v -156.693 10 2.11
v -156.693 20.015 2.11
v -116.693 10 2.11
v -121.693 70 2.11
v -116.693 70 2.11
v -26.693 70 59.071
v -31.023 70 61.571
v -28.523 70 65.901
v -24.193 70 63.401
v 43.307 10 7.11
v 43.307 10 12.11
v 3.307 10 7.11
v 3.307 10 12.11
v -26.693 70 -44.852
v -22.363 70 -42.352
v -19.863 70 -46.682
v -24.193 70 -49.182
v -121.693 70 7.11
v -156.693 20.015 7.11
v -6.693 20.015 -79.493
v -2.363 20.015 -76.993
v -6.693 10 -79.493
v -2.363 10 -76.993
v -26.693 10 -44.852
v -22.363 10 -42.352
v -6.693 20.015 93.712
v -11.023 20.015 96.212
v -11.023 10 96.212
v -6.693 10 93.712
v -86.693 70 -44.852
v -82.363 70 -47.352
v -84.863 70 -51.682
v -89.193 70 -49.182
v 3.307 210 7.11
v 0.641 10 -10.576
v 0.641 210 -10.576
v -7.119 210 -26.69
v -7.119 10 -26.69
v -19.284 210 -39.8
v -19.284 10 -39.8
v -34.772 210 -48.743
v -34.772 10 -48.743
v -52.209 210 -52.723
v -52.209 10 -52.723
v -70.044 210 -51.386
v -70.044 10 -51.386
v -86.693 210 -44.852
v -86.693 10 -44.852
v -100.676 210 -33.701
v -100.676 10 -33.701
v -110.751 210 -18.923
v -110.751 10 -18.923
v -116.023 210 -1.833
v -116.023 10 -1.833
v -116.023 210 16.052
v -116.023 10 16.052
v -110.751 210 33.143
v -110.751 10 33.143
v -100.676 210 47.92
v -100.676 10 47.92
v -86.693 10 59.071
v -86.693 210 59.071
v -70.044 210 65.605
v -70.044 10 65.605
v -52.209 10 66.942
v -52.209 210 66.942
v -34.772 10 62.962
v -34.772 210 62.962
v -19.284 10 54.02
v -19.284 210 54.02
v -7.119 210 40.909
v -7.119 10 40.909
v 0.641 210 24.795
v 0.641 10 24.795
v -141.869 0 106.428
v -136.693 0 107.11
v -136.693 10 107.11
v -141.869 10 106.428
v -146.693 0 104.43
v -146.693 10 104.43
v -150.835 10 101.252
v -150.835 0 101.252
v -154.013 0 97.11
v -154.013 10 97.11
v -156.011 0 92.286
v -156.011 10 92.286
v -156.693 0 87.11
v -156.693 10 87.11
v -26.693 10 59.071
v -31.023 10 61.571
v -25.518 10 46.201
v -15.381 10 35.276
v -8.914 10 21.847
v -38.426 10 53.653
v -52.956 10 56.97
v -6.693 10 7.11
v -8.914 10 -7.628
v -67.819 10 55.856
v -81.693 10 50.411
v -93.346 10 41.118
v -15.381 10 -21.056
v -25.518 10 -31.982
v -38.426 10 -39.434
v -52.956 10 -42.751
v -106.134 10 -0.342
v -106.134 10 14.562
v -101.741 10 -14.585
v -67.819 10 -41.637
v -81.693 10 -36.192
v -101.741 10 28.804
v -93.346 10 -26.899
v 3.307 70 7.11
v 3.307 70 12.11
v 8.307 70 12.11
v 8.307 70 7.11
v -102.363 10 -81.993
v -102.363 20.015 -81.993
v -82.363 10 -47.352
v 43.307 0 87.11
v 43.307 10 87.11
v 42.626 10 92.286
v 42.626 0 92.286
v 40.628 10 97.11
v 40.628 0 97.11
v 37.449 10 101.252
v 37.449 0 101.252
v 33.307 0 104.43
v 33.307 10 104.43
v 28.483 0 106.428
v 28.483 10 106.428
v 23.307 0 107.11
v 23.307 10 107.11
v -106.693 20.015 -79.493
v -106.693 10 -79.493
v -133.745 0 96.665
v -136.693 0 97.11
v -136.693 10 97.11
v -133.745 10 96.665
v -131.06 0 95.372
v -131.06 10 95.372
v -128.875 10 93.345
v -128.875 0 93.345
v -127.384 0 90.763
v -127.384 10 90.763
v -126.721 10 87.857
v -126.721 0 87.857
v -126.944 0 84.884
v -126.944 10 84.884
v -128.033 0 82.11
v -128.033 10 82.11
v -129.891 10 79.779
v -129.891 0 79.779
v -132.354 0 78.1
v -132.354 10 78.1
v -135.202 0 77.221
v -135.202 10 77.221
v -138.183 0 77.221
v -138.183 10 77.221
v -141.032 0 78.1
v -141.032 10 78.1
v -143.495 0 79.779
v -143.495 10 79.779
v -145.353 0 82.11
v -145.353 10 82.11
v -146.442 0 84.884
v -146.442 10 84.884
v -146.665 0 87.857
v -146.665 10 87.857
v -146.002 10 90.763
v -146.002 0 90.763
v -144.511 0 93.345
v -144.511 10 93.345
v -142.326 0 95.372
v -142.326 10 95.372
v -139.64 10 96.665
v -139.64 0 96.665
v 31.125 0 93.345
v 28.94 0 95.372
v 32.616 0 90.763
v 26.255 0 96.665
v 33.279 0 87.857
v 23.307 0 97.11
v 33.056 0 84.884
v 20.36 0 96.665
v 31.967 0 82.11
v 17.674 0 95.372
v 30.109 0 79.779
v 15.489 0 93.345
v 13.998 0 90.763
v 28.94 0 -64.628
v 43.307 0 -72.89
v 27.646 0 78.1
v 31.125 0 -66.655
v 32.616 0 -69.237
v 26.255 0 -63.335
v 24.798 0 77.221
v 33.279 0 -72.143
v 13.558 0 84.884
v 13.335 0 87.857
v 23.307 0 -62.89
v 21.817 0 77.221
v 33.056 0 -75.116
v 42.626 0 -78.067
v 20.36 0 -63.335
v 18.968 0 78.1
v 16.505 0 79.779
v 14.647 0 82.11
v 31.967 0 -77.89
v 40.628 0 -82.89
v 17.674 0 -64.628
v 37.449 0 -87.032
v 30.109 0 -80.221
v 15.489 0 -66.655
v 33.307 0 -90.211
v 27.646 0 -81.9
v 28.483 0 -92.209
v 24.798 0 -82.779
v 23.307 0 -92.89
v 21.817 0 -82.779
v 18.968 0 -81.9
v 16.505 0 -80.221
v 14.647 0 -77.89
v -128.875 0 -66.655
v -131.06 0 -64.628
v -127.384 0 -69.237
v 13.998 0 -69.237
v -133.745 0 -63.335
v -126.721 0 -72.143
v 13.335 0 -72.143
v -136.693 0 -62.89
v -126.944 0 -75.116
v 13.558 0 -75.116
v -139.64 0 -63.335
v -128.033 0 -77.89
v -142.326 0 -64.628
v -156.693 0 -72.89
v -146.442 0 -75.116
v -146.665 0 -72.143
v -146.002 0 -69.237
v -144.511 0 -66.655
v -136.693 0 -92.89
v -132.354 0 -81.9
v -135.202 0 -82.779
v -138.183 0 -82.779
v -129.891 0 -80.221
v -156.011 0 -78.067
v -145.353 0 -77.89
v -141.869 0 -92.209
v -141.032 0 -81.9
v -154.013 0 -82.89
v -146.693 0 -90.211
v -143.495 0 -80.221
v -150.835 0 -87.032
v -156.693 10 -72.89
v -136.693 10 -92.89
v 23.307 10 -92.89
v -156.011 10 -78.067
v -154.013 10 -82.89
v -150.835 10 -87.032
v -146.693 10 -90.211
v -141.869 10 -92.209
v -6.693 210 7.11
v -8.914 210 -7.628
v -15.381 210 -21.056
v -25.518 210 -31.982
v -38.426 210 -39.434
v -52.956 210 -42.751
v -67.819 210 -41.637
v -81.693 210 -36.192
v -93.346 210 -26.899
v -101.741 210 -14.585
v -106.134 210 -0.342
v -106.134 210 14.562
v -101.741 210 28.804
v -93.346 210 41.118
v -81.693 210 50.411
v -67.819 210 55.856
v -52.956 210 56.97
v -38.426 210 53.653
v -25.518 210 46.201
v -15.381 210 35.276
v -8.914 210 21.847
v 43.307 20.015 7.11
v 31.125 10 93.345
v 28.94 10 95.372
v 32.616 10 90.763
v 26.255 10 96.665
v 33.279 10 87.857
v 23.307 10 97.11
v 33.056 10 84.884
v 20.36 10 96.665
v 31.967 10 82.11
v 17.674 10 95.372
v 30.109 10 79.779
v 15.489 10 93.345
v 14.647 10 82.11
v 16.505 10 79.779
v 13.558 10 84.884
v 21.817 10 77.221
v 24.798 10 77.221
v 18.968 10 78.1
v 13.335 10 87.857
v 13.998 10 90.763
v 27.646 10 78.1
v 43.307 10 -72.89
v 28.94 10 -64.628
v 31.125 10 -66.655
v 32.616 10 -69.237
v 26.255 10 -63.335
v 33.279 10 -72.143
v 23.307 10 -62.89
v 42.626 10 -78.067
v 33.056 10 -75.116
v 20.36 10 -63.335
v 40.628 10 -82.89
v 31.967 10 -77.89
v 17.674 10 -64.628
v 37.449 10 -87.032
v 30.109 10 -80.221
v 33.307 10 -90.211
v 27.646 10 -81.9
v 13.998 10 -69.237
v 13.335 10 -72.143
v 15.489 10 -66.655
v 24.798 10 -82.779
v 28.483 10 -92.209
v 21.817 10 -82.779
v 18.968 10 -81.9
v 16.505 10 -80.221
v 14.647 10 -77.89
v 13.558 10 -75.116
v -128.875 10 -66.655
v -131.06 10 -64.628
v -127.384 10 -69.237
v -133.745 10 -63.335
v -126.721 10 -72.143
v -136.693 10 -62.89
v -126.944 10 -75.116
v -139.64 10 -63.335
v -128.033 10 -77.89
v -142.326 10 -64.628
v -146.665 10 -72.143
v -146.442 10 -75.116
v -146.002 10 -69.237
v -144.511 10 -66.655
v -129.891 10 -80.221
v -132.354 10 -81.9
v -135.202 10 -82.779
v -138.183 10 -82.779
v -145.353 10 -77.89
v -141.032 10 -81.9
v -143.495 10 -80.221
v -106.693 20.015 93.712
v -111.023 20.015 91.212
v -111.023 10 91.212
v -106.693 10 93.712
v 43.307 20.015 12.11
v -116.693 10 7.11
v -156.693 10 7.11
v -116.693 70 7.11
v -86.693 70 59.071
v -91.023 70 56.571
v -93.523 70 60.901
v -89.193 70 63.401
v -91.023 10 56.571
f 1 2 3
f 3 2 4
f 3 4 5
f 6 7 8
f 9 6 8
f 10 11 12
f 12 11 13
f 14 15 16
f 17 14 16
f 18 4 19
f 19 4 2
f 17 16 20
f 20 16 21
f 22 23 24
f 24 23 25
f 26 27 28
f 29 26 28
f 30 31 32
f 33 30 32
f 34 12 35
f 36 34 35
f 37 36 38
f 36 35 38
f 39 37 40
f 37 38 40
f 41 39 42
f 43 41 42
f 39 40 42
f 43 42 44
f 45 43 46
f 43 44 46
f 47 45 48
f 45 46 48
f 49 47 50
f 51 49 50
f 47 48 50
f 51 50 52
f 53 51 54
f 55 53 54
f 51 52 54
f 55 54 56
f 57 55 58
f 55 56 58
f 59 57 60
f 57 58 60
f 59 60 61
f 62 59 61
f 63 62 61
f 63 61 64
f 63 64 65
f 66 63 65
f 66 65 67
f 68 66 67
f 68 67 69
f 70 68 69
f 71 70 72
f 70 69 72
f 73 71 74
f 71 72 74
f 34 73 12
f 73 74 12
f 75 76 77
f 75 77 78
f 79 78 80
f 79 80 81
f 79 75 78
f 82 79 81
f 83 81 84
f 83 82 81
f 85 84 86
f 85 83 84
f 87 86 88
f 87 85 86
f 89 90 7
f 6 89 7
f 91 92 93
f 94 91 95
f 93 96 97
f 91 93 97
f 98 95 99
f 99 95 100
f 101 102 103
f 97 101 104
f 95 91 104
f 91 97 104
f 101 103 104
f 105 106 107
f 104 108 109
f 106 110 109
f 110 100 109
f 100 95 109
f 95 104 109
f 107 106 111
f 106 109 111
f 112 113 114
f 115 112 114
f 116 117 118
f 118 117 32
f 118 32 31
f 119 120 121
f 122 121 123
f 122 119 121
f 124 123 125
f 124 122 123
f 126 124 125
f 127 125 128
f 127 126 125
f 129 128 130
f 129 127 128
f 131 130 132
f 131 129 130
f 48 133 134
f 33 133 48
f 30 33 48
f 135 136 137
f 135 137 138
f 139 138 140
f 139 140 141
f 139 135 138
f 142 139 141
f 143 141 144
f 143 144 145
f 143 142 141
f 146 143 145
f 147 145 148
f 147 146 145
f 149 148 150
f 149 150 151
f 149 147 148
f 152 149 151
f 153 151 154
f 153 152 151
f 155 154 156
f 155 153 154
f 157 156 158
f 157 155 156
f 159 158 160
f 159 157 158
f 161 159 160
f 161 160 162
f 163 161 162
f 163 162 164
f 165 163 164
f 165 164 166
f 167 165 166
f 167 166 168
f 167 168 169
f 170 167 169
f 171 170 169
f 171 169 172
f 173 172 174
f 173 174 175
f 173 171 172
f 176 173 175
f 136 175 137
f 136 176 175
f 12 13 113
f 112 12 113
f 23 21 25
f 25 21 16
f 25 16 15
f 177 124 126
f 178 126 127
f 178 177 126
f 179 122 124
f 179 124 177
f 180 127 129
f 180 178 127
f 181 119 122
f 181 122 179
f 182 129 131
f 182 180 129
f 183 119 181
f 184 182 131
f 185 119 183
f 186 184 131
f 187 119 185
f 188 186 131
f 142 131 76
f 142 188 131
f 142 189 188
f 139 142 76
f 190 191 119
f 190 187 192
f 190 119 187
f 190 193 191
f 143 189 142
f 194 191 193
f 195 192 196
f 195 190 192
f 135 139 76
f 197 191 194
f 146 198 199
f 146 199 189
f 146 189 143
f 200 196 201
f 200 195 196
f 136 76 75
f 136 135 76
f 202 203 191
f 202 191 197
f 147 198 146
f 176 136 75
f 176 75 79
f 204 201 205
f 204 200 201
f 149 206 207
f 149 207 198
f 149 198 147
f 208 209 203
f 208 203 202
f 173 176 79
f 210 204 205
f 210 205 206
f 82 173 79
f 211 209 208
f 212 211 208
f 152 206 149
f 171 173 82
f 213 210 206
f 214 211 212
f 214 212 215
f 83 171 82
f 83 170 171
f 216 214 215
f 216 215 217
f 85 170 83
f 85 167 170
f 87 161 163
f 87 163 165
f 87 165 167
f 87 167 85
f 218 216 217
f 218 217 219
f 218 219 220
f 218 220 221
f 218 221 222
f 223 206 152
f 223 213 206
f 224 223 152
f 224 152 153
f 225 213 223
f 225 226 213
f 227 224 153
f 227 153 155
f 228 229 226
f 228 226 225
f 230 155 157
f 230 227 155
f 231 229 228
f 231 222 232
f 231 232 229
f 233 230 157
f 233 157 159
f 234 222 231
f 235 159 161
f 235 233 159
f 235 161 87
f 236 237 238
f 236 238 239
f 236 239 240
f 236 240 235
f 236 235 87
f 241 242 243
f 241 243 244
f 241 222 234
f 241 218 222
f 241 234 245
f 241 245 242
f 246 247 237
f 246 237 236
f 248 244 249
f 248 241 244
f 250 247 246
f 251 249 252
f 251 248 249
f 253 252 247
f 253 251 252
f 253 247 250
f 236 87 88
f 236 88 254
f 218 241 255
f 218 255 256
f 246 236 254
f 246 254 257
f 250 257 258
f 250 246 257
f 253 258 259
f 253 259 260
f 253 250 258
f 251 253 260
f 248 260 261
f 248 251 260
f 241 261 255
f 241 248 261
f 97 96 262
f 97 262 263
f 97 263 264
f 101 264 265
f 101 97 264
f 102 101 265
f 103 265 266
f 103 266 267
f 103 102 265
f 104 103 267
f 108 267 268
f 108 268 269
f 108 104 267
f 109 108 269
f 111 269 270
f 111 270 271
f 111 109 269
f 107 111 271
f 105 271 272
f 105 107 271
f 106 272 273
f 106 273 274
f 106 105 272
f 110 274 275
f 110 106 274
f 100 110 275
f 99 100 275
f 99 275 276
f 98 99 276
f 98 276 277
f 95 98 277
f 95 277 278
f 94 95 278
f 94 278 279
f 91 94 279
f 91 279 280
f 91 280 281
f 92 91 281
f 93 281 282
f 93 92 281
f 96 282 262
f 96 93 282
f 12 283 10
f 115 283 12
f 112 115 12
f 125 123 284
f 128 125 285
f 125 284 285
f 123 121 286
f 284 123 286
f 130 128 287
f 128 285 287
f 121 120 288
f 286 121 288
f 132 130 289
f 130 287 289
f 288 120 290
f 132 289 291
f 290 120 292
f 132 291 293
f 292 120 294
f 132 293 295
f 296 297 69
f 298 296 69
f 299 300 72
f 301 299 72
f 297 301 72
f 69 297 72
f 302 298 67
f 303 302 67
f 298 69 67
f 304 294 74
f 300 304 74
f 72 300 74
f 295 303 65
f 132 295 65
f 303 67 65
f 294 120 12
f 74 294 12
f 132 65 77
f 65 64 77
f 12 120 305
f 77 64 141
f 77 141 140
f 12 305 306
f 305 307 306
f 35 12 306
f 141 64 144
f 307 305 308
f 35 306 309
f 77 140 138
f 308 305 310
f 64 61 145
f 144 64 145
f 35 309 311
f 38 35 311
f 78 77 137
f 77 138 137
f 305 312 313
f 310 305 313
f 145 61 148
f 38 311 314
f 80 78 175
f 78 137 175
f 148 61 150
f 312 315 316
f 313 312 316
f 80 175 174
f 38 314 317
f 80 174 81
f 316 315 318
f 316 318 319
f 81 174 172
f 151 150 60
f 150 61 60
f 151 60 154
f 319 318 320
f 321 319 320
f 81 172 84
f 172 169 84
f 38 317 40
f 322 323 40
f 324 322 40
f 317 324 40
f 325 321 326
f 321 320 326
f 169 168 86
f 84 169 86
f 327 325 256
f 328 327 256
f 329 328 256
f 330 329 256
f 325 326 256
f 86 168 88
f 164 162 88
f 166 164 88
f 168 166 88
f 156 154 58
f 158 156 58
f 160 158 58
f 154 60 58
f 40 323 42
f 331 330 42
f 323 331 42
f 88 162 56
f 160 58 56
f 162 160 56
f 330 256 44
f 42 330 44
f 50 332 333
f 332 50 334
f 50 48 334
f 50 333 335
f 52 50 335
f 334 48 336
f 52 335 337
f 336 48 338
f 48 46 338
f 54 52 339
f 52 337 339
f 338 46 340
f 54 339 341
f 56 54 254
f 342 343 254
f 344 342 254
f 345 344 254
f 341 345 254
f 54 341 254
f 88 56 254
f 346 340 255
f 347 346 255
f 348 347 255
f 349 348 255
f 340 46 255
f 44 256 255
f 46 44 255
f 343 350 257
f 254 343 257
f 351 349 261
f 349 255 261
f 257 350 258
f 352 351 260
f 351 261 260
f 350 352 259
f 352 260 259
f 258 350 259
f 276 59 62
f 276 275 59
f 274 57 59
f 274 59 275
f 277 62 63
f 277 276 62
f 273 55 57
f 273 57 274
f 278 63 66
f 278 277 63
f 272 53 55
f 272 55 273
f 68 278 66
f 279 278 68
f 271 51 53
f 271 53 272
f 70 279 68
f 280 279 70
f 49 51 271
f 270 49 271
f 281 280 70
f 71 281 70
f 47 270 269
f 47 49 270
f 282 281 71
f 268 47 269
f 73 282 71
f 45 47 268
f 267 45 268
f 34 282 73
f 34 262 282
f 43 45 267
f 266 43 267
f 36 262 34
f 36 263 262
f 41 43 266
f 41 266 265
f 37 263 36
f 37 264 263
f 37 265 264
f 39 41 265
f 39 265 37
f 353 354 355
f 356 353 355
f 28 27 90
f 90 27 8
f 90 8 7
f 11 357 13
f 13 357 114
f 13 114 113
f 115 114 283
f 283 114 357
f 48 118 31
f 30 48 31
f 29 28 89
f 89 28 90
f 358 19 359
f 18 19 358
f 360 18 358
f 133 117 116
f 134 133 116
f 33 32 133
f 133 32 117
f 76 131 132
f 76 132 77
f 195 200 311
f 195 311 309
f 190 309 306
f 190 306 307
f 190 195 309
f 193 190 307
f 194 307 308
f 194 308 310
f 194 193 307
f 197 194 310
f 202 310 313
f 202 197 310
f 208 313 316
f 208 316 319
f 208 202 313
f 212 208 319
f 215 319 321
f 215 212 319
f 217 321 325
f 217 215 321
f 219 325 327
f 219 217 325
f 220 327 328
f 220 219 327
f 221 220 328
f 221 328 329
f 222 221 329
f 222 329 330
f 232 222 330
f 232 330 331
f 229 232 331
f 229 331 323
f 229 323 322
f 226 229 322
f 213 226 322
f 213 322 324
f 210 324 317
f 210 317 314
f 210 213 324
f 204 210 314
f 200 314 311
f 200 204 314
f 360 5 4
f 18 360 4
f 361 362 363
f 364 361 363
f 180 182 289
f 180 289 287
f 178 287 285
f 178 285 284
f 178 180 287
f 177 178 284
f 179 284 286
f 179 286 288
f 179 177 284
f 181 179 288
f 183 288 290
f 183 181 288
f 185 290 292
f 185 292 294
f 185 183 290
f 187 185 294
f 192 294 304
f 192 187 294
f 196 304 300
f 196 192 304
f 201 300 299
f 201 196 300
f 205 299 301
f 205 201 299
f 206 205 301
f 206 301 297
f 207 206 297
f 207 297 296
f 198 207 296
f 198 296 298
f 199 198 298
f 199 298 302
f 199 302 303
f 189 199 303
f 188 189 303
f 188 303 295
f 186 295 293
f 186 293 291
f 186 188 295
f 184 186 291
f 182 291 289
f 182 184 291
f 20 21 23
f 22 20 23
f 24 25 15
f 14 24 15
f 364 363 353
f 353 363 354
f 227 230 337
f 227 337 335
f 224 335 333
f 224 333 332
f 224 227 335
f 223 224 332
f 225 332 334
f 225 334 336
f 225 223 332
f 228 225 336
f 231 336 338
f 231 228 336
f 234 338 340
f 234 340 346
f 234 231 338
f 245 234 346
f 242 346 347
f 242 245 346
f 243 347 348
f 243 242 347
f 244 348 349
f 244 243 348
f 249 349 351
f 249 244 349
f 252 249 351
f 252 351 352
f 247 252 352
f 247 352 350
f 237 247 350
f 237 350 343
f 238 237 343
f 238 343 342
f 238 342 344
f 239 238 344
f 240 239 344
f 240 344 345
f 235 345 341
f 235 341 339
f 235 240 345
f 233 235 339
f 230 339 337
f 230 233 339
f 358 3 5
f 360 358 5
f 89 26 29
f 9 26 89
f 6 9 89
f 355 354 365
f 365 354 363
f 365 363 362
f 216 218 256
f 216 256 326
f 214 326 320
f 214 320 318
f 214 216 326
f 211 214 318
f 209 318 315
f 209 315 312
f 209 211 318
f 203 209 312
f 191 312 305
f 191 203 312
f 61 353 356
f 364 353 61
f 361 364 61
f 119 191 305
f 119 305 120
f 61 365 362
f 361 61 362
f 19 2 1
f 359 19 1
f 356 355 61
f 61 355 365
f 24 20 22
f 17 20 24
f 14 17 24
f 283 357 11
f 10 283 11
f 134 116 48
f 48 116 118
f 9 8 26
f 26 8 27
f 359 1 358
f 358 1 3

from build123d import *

# Parameters (mm, degrees)
SKETCH1_R           = 10
BOSS_EXTRUDE1_DEPTH = 10
SKETCH2_R           = 60
SKETCH2_R_2         = 50
EXTRUDE_THIN1_DEPTH = 200
GUSSET1_START       = 2.109678302
GUSSET1_DEPTH       = 5
CIRPATTERN1_COUNT   = 6


# Read off the part's stored shape, not the designer's step: Gusset1
with BuildPart() as part:
    # Sketch1 → Boss-Extrude1 (new body)
    with BuildSketch(Plane(origin=(0, 0, 0), x_dir=(1, 0, 0), z_dir=(0, 1, 0))):
        with BuildLine():
            Line((-136.692913386, 92.890321698), (23.307086614, 92.890321698))
            ThreePointArc((23.307086614, 92.890321698), (37.449222238, 87.032457321), (43.307086614, 72.890321698))
            Line((43.307086614, 72.890321698), (43.307086614, -87.109678302))
            ThreePointArc((43.307086614, -87.109678302), (37.449222238, -101.251813926), (23.307086614, -107.109678302))
            Line((23.307086614, -107.109678302), (-136.692913386, -107.109678302))
            ThreePointArc((-136.692913386, -107.109678302), (-150.83504901, -101.251813926), (-156.692913386, -87.109678302))
            Line((-156.692913386, -87.109678302), (-156.692913386, 72.890321698))
            ThreePointArc((-156.692913386, 72.890321698), (-150.83504901, 87.032457321), (-136.692913386, 92.890321698))
        make_face()
        with Locations(Location((-136.692913386, 72.890321698, 0), (0, 0, 270))):
            Circle(SKETCH1_R, mode=Mode.SUBTRACT)
        with Locations(Location((-136.692913386, -87.109678302, 0), (0, 0, 270))):
            Circle(SKETCH1_R, mode=Mode.SUBTRACT)
        with Locations(Location((23.307086614, -87.109678302, 0), (0, 0, 270))):
            Circle(SKETCH1_R, mode=Mode.SUBTRACT)
        with Locations(Location((23.307086614, 72.890321698, 0), (0, 0, 270))):
            Circle(SKETCH1_R, mode=Mode.SUBTRACT)
    extrude(amount=BOSS_EXTRUDE1_DEPTH)

    # Sketch2 → Extrude-Thin1 (add)
    with BuildSketch(Plane(origin=(0, 10, 0), x_dir=(1, 0, 0), z_dir=(0, 1, 0))):
        with Locations((-56.692913386, -7.109678302)):
            Circle(SKETCH2_R)
        with Locations((-56.692913386, -7.109678302)):
            Circle(SKETCH2_R_2, mode=Mode.SUBTRACT)
    extrude(amount=EXTRUDE_THIN1_DEPTH)


with BuildPart() as body_2:
    # Gusset1 outline → Gusset1 (new body)
    with BuildSketch(Plane.XY.offset(GUSSET1_START)):
        Polygon((-116.692913386, 70), (-121.692913386, 70), (-156.692913386, 20.014819764), (-156.692913386, 10), (-116.692913386, 10), align=None)
    extrude(amount=GUSSET1_DEPTH)


with BuildPart() as cirpattern1_1:
    # CirPattern1: pattern copy
    add(body_2.part.rotate(Axis((-56.692913386, 0, 7.109678302), (0, 1, 0)), 1 * 360 / CIRPATTERN1_COUNT))


with BuildPart() as cirpattern1_2:
    # CirPattern1: pattern copy
    add(body_2.part.rotate(Axis((-56.692913386, 0, 7.109678302), (0, 1, 0)), 2 * 360 / CIRPATTERN1_COUNT))


with BuildPart() as cirpattern1_3:
    # CirPattern1: pattern copy
    add(body_2.part.rotate(Axis((-56.692913386, 0, 7.109678302), (0, 1, 0)), 3 * 360 / CIRPATTERN1_COUNT))


with BuildPart() as cirpattern1_4:
    # CirPattern1: pattern copy
    add(body_2.part.rotate(Axis((-56.692913386, 0, 7.109678302), (0, 1, 0)), 4 * 360 / CIRPATTERN1_COUNT))


with BuildPart() as cirpattern1_5:
    # CirPattern1: pattern copy
    add(body_2.part.rotate(Axis((-56.692913386, 0, 7.109678302), (0, 1, 0)), 5 * 360 / CIRPATTERN1_COUNT))


solid = Compound([part.part, body_2.part, cirpattern1_1.part, cirpattern1_2.part, cirpattern1_3.part, cirpattern1_4.part, cirpattern1_5.part])
